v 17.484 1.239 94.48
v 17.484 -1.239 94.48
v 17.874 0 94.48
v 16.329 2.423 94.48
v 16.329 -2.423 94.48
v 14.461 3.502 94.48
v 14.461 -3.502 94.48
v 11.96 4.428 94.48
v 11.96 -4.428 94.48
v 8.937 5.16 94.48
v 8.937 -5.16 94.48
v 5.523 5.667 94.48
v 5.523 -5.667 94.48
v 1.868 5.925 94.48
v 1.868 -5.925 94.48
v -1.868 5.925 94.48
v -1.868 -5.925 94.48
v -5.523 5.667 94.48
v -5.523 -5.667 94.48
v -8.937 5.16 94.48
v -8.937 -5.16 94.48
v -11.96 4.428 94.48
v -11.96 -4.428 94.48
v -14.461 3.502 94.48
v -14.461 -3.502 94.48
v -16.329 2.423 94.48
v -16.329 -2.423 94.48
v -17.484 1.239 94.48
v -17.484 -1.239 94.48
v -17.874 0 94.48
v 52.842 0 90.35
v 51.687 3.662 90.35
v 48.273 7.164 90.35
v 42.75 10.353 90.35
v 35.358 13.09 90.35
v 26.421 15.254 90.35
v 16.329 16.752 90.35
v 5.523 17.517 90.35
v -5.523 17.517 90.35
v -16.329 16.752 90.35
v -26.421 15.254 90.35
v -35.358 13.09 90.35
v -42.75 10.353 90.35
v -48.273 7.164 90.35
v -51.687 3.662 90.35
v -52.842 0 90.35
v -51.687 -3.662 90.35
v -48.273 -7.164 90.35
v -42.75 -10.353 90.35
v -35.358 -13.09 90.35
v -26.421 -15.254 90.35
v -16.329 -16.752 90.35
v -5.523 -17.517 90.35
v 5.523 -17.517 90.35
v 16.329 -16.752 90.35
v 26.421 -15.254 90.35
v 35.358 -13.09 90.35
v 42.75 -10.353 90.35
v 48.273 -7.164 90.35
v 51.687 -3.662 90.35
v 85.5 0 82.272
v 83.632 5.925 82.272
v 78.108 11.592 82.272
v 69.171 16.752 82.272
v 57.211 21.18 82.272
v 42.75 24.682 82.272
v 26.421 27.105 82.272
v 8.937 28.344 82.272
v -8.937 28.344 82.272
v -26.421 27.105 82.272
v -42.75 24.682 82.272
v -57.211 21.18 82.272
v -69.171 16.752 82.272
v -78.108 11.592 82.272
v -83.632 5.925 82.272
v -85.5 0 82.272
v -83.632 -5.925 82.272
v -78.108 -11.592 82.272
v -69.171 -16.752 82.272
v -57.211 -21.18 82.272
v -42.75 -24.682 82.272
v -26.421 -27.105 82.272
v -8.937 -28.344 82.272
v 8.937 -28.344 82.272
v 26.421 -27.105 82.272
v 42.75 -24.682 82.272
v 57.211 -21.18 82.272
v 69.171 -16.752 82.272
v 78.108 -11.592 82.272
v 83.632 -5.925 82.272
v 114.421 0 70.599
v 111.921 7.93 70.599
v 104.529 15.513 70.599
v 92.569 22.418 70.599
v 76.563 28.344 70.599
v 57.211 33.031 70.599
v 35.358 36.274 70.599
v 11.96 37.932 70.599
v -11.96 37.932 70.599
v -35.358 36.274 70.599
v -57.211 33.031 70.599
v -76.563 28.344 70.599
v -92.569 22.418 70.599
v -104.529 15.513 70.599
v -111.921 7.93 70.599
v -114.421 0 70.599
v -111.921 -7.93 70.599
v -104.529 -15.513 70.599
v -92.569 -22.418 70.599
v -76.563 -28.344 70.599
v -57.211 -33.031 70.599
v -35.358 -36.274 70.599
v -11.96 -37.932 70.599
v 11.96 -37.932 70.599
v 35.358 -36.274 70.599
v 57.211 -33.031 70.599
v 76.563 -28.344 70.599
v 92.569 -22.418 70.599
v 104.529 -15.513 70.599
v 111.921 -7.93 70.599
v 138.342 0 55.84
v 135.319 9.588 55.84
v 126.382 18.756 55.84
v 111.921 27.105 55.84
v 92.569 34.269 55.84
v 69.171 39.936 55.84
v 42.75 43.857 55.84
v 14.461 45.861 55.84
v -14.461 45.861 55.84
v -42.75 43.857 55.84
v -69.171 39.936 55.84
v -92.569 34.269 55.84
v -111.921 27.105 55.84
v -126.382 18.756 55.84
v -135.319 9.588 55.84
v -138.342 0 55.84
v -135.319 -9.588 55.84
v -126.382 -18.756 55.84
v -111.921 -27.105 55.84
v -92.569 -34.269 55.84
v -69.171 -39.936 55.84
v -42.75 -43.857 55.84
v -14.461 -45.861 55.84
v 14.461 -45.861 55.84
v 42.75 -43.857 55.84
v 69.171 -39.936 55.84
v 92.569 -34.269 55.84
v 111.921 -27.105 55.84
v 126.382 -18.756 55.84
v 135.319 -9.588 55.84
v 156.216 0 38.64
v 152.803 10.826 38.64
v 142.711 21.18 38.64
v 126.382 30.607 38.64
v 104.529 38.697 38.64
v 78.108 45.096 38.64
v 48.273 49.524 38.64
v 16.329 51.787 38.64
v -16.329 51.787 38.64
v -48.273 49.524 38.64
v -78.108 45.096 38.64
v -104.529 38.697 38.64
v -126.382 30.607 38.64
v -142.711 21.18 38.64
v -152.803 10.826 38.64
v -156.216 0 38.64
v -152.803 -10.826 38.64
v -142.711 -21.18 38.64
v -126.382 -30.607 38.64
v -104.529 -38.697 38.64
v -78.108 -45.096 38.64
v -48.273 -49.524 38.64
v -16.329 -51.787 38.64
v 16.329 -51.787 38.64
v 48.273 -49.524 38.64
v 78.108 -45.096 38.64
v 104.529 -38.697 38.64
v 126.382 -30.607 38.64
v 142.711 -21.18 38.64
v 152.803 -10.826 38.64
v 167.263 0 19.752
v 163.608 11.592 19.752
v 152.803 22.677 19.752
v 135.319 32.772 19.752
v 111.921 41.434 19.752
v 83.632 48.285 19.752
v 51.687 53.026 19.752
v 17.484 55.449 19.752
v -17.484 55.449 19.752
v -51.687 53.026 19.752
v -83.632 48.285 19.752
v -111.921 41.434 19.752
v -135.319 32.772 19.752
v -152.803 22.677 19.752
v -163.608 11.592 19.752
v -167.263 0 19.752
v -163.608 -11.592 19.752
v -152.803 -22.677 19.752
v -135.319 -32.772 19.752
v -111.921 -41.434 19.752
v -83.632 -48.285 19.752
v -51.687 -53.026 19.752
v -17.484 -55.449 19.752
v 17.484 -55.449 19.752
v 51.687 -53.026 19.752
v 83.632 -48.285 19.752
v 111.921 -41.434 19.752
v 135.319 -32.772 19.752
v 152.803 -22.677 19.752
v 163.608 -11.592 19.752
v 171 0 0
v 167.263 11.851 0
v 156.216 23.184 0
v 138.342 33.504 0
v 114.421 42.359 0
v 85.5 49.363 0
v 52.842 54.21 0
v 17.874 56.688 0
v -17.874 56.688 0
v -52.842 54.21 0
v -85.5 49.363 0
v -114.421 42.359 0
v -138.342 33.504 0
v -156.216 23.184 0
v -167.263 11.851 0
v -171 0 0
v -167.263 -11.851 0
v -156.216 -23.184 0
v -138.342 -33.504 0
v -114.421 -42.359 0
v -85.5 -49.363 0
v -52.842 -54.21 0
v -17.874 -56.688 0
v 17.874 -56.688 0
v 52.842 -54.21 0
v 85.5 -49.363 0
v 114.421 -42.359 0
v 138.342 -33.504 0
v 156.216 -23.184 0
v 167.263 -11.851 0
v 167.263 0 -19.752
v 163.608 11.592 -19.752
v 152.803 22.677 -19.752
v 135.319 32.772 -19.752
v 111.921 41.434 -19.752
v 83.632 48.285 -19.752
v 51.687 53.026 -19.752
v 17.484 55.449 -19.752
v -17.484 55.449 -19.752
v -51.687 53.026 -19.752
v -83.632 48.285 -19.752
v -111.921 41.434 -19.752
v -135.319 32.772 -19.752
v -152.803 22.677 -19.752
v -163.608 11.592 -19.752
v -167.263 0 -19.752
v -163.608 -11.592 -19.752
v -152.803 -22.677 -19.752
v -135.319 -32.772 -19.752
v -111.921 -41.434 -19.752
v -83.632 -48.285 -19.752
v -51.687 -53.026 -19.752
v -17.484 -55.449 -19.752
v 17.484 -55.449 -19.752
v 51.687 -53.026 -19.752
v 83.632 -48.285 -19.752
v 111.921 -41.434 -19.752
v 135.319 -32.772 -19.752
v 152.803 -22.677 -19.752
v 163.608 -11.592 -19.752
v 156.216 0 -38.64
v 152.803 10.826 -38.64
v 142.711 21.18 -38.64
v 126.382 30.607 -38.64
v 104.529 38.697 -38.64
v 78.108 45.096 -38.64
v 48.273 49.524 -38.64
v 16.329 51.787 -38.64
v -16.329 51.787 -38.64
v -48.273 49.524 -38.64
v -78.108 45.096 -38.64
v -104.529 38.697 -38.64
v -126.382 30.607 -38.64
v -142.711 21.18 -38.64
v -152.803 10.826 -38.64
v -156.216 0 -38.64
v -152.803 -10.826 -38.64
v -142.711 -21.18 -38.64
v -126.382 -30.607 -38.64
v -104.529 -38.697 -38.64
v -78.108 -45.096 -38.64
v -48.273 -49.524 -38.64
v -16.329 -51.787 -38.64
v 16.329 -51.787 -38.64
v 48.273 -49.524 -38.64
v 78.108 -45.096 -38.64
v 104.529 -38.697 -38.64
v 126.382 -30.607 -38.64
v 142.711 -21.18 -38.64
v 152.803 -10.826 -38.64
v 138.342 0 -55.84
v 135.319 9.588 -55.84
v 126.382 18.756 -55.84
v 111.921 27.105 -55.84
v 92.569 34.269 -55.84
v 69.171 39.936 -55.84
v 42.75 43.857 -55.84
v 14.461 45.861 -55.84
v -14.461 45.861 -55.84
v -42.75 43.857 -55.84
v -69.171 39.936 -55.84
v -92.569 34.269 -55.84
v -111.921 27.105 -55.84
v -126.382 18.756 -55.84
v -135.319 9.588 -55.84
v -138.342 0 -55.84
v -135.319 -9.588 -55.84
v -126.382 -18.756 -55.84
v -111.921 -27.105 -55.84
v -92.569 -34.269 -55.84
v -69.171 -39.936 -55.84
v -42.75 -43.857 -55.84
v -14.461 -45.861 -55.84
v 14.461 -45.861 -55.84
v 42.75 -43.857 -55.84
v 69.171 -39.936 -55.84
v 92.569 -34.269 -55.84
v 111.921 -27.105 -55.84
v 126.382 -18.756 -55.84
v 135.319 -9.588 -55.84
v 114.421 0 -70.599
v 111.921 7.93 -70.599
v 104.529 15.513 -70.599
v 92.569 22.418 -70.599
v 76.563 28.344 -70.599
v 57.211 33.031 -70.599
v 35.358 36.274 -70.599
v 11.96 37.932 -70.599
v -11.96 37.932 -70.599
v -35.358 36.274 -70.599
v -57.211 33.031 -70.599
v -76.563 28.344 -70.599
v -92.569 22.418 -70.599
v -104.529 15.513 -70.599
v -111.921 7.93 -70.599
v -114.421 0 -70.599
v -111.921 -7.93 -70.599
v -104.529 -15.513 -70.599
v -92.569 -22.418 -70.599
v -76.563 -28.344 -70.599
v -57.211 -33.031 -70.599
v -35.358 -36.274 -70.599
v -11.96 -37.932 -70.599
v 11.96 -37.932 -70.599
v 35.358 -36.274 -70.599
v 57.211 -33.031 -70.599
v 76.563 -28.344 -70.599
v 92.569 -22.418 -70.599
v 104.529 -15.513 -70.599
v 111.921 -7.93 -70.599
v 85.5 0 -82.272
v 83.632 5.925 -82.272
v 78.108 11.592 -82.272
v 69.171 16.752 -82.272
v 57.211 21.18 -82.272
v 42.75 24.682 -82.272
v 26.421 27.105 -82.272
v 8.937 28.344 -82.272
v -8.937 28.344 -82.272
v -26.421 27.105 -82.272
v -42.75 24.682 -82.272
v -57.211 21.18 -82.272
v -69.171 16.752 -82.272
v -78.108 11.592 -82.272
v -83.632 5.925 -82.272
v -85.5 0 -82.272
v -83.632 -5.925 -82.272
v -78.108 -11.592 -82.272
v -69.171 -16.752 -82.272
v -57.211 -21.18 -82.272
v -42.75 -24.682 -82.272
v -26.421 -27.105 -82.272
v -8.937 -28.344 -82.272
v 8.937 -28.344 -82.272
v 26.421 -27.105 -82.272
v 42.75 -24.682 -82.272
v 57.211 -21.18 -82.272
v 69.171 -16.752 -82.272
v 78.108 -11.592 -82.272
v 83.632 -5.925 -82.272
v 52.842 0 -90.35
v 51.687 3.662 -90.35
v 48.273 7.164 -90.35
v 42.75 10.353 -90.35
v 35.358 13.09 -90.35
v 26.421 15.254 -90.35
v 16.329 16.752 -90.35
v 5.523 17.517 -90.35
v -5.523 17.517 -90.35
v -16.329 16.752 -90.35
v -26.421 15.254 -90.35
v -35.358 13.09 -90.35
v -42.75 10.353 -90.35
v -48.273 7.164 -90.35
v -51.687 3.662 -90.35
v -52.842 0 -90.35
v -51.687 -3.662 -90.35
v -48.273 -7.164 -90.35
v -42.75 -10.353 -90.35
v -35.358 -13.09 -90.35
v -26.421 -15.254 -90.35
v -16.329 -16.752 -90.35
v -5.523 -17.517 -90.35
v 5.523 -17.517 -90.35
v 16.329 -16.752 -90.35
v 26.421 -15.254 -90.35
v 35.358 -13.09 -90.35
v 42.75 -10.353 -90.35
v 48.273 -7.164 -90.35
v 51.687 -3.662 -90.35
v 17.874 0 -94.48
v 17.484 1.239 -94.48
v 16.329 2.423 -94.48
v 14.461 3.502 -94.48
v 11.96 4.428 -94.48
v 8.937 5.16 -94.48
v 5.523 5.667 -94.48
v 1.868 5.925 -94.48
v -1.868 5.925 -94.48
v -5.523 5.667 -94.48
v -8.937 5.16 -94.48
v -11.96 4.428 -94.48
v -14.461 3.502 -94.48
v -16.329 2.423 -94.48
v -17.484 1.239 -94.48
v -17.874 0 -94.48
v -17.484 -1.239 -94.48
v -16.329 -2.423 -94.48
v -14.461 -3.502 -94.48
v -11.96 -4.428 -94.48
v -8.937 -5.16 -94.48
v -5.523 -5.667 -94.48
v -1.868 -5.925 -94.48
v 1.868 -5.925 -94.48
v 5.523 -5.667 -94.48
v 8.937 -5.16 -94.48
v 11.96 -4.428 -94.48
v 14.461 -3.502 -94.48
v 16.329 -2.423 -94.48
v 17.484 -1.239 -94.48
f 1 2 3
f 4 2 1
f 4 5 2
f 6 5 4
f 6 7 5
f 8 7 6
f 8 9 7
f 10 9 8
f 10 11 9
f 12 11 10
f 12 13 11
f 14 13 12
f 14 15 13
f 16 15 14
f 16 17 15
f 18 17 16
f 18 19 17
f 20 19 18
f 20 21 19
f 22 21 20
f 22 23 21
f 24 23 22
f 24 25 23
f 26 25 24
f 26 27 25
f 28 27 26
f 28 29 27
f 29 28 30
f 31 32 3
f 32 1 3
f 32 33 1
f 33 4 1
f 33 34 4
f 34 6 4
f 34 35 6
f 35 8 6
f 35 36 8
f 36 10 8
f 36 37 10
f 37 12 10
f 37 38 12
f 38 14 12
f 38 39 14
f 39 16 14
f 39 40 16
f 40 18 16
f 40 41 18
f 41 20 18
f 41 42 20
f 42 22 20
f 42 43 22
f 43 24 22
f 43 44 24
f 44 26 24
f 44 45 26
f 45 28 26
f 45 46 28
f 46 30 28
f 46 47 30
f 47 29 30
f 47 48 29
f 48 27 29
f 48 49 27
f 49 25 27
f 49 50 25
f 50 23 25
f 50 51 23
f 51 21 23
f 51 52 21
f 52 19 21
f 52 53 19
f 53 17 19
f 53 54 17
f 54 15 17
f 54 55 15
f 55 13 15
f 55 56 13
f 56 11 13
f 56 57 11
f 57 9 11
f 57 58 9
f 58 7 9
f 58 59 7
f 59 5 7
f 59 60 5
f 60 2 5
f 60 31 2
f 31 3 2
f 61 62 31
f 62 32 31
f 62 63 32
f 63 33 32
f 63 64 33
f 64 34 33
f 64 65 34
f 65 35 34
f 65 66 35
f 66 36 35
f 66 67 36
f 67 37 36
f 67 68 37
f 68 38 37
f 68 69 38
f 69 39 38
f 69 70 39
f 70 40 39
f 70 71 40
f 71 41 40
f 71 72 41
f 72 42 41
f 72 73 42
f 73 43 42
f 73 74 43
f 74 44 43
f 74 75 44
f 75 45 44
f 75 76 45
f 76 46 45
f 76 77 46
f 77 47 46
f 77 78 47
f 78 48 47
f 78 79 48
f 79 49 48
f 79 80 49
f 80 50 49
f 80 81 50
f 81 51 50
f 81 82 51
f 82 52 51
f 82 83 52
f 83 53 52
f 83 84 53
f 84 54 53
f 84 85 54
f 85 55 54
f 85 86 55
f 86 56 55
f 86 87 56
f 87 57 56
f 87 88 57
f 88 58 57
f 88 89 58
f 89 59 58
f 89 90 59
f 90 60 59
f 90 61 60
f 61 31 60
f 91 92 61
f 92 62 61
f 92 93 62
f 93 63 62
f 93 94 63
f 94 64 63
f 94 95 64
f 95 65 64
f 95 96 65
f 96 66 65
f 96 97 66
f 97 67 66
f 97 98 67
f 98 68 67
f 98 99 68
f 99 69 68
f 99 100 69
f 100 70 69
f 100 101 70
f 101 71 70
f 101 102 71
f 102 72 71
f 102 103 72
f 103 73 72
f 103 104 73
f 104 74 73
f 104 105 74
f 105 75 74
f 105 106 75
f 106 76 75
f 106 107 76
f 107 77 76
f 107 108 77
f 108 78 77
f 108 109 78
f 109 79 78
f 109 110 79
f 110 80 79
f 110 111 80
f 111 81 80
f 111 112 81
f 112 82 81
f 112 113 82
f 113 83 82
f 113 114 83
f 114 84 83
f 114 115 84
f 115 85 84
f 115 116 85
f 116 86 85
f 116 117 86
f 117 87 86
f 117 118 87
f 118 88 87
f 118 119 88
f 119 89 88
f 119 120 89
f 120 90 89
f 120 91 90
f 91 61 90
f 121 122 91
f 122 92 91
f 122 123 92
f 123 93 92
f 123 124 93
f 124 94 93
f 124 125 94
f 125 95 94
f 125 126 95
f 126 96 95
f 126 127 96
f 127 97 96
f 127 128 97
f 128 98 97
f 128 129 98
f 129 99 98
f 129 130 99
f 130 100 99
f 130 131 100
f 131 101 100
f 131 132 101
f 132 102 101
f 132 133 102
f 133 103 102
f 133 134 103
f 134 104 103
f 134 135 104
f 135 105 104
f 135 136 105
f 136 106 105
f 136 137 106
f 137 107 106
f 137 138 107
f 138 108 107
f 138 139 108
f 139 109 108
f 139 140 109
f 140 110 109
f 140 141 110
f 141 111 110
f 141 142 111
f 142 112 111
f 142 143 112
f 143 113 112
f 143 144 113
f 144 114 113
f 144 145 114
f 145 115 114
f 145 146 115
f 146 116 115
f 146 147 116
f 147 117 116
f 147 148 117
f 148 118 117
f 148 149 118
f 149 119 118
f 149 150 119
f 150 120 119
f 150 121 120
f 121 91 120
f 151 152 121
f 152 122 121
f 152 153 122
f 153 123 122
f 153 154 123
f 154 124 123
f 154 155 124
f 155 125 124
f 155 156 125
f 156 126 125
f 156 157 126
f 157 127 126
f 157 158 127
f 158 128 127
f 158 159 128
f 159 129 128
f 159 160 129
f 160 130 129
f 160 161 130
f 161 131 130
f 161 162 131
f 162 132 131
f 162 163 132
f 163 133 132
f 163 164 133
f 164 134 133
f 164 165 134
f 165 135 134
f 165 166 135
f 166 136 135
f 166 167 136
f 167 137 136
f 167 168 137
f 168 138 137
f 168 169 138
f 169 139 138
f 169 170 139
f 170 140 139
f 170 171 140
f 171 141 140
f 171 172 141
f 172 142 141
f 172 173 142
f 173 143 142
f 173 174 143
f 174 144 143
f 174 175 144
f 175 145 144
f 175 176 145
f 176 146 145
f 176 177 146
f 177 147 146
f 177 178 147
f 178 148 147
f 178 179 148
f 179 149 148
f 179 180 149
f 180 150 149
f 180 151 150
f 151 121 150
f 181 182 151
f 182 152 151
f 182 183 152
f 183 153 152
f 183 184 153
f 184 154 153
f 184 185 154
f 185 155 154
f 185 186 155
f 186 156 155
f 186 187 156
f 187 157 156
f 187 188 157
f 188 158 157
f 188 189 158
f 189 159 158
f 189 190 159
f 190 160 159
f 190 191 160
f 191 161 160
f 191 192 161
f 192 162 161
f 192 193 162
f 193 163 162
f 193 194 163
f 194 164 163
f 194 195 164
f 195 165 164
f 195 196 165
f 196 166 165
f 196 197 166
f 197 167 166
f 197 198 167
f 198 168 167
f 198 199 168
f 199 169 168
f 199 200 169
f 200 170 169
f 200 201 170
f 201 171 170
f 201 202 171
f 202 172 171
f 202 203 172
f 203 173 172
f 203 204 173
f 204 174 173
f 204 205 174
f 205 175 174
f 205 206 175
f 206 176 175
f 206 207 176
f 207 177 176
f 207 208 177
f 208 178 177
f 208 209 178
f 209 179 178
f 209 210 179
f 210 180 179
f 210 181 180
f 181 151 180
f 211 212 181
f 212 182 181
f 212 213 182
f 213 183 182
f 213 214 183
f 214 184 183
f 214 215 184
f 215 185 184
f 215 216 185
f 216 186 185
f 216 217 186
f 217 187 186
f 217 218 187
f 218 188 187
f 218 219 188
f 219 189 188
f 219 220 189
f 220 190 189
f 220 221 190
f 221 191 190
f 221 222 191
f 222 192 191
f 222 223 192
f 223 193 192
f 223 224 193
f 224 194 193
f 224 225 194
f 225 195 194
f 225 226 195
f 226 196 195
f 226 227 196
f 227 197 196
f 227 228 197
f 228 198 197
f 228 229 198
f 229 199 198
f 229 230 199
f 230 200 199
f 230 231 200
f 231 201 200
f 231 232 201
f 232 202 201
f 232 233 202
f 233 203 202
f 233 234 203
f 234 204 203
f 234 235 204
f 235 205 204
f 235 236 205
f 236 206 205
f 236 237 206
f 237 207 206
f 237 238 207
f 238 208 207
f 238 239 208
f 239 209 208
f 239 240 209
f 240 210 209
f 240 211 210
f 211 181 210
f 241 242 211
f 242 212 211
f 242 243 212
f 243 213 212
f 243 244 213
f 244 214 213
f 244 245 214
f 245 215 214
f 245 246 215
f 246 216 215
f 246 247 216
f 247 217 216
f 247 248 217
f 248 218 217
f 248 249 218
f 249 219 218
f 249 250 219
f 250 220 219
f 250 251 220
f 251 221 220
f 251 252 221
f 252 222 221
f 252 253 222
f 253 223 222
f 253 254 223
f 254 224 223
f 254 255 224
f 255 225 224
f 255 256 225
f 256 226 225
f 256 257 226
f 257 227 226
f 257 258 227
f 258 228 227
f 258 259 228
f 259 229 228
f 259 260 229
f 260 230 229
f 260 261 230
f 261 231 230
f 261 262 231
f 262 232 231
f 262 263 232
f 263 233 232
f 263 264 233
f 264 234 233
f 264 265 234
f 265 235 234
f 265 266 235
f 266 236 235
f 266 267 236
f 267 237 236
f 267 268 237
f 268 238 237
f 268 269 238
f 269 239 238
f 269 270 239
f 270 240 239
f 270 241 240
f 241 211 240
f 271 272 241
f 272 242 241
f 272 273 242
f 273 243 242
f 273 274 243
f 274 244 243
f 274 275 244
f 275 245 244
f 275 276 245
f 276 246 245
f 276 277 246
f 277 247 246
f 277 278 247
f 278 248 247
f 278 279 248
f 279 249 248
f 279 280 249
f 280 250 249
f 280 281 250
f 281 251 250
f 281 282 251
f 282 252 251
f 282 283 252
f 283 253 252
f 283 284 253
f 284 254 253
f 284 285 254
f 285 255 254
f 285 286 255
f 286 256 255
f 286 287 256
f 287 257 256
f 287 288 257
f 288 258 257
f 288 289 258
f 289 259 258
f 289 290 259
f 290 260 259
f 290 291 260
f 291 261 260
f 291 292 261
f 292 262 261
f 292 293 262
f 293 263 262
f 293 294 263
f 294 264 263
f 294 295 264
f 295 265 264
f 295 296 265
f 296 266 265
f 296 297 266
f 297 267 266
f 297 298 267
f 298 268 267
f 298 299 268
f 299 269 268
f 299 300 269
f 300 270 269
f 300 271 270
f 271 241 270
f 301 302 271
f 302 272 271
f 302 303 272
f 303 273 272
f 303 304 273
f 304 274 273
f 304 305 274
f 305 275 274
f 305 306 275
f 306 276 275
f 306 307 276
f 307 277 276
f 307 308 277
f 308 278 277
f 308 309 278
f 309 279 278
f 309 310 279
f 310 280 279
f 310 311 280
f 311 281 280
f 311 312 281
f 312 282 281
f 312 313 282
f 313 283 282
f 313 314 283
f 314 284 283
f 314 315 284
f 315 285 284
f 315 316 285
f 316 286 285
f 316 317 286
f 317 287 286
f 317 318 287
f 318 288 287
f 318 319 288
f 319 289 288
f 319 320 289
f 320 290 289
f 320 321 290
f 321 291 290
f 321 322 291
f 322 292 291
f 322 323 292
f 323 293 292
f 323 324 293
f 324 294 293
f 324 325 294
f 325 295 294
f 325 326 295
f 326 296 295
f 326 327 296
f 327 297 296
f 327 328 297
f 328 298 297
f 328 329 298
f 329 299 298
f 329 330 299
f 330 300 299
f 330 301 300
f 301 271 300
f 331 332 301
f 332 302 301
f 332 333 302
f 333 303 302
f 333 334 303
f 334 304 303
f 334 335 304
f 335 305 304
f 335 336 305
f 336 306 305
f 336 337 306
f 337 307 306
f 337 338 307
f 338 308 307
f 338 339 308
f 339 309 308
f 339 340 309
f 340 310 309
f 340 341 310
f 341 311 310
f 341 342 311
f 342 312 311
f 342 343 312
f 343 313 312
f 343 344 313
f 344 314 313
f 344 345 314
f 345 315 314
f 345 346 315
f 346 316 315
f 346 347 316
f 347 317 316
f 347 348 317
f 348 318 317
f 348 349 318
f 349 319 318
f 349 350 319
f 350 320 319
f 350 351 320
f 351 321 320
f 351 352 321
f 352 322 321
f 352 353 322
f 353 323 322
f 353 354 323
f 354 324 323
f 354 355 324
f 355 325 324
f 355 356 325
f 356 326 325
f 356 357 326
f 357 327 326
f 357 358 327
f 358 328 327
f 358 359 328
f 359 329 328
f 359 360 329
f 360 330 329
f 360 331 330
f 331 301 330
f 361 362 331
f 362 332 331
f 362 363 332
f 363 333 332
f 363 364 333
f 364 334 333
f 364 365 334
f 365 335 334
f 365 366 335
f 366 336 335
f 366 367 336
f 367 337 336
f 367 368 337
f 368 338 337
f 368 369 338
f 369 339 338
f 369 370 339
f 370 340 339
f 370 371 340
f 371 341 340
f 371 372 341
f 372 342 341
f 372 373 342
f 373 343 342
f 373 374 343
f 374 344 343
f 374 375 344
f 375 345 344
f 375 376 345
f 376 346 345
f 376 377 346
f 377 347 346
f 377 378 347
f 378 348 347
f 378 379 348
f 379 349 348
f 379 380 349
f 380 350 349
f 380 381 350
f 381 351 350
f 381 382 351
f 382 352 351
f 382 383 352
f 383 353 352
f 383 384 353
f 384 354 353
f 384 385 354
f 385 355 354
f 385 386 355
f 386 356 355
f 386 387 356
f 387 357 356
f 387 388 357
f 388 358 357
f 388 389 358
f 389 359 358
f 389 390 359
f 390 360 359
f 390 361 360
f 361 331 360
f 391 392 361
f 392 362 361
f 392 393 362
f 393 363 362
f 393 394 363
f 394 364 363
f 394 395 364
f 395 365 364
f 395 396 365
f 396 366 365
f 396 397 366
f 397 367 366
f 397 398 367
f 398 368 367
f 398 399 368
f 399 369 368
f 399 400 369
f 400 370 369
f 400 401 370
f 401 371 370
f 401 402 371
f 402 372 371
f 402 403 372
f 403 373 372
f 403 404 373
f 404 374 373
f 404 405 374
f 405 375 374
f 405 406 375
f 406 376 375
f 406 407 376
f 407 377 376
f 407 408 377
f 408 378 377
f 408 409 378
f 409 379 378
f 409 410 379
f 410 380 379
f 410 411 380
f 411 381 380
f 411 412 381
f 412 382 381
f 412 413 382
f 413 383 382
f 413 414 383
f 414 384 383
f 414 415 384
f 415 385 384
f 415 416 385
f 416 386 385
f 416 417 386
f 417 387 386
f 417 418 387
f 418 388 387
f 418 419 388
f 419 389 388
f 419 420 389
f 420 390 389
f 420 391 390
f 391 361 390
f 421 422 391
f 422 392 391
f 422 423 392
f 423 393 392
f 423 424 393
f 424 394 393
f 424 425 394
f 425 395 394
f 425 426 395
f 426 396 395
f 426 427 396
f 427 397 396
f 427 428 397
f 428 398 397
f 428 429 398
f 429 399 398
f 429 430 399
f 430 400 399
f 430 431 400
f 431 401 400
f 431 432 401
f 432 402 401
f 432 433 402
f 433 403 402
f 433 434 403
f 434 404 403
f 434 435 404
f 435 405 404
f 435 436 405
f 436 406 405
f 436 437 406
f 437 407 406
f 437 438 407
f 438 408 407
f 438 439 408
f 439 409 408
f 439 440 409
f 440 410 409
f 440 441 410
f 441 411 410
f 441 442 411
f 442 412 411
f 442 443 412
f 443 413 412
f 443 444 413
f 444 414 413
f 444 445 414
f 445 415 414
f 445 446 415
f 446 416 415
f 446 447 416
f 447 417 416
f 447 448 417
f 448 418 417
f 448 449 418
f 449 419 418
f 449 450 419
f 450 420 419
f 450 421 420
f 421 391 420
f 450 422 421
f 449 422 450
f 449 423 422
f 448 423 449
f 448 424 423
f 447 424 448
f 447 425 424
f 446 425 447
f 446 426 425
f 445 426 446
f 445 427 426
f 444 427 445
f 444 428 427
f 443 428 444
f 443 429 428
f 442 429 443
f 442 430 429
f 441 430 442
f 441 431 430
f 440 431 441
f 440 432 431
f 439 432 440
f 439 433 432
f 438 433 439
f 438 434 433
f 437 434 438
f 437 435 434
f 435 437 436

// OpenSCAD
// Generated by SolidPython 1.0.1 on 2020-07-29 00:46:48


scale(v = [9, 3, 5]) {
	sphere(r = 19);
}
/***********************************************
*********      SolidPython code:      **********
************************************************
 
# import packages: SolidPython
from solid import *
from solid.utils import *
from itertools import chain, combinations, permutations


class Resize:

    def __init__(self, scad_file):
        self.scad_file = scad_file
        #self.scad_file = import_scad(scad_file)
        # cone/cylinder param:
        self.r1 = 0
        self.r2 = 0
        self.h = 0
        # rectangular prism param:
        self.w = 0
        self.l = 0
        # ellipse param:
        self.r = 0

    # import OpenScad code (file name corresponds to shape)


    # classify shape + parameters
    def assign(self, param1, param2, param3):
        if self.scad_file == 'cone.scad':
            self.r1 = param1
            self.r2 = param2
            self.h = param3
        elif self.scad_file == 'cylinder.scad':
            self.r1 = param1
            self.r2 = param2
            self.h = param3
        elif self.scad_file == 'rectangularPrism.scad':
            self.h = param1
            self.l = param2
            self.w = param3
        else:
            self.r = param1
            self.h = param2

    # resize parameters
    def iterate(self):
        x = range(3, 20, 2)
        i = 1
        if self.scad_file == 'cone.scad':
            tempList = list(permutations(x, 2))
            for temp in tempList:
                param1 = temp[0]
                param2 = temp[1]
                filepath = 'produced_scad_files/' + 'cone' + str(param1) + '_' + str(param2) + '_' + '.scad'
                scad_render_to_file(cylinder(h=param1, r1=param2, r2=0), filepath)

        elif self.scad_file == 'cylinder.scad':
            tempList = list(permutations(x, 3))
            for temp in tempList:
                param1 = temp[0]
                param2 = temp[1]
                filepath = 'produced_scad_files/' + 'cylinder' + str(param1) + '_' + str(param2) + '_' + '.scad'
                scad_render_to_file(cylinder(h=param1, r1=param2, r2=param2), filepath)

        elif self.scad_file == 'rectangularPrism.scad':
            tempList = list(permutations(x, 3))
            for temp in tempList:
                param1 = temp[0]
                param2 = temp[1]
                param3 = temp[2]
                filepath = 'produced_scad_files/' + 'rectangularPrism' + str(param1) + '_' + str(param2) + '_' + str(
                    param3) + '.scad'
                scad_render_to_file(cube(size=(param1, param2, param3)), filepath)

        elif self.scad_file == 'ellipse.scad':
            tempList = list(permutations(x, 4))
            for temp in tempList:
                param1 = temp[0]
                param2 = temp[1]
                param3 = temp[2]
                param4 = temp[3]
                filepath = 'produced_scad_files/' + 'ellipse' + str(param1) + '_' + str(param2) + '_' + str(param3) + '_' + str(param4) + '.scad'
                scad_render_to_file(scale([param1, param2, param3])(sphere(r=param4)), filepath)

    def render_to_scadfile(self):
        scad_render_to_file(scad, 'example.scad') 
 
************************************************/
